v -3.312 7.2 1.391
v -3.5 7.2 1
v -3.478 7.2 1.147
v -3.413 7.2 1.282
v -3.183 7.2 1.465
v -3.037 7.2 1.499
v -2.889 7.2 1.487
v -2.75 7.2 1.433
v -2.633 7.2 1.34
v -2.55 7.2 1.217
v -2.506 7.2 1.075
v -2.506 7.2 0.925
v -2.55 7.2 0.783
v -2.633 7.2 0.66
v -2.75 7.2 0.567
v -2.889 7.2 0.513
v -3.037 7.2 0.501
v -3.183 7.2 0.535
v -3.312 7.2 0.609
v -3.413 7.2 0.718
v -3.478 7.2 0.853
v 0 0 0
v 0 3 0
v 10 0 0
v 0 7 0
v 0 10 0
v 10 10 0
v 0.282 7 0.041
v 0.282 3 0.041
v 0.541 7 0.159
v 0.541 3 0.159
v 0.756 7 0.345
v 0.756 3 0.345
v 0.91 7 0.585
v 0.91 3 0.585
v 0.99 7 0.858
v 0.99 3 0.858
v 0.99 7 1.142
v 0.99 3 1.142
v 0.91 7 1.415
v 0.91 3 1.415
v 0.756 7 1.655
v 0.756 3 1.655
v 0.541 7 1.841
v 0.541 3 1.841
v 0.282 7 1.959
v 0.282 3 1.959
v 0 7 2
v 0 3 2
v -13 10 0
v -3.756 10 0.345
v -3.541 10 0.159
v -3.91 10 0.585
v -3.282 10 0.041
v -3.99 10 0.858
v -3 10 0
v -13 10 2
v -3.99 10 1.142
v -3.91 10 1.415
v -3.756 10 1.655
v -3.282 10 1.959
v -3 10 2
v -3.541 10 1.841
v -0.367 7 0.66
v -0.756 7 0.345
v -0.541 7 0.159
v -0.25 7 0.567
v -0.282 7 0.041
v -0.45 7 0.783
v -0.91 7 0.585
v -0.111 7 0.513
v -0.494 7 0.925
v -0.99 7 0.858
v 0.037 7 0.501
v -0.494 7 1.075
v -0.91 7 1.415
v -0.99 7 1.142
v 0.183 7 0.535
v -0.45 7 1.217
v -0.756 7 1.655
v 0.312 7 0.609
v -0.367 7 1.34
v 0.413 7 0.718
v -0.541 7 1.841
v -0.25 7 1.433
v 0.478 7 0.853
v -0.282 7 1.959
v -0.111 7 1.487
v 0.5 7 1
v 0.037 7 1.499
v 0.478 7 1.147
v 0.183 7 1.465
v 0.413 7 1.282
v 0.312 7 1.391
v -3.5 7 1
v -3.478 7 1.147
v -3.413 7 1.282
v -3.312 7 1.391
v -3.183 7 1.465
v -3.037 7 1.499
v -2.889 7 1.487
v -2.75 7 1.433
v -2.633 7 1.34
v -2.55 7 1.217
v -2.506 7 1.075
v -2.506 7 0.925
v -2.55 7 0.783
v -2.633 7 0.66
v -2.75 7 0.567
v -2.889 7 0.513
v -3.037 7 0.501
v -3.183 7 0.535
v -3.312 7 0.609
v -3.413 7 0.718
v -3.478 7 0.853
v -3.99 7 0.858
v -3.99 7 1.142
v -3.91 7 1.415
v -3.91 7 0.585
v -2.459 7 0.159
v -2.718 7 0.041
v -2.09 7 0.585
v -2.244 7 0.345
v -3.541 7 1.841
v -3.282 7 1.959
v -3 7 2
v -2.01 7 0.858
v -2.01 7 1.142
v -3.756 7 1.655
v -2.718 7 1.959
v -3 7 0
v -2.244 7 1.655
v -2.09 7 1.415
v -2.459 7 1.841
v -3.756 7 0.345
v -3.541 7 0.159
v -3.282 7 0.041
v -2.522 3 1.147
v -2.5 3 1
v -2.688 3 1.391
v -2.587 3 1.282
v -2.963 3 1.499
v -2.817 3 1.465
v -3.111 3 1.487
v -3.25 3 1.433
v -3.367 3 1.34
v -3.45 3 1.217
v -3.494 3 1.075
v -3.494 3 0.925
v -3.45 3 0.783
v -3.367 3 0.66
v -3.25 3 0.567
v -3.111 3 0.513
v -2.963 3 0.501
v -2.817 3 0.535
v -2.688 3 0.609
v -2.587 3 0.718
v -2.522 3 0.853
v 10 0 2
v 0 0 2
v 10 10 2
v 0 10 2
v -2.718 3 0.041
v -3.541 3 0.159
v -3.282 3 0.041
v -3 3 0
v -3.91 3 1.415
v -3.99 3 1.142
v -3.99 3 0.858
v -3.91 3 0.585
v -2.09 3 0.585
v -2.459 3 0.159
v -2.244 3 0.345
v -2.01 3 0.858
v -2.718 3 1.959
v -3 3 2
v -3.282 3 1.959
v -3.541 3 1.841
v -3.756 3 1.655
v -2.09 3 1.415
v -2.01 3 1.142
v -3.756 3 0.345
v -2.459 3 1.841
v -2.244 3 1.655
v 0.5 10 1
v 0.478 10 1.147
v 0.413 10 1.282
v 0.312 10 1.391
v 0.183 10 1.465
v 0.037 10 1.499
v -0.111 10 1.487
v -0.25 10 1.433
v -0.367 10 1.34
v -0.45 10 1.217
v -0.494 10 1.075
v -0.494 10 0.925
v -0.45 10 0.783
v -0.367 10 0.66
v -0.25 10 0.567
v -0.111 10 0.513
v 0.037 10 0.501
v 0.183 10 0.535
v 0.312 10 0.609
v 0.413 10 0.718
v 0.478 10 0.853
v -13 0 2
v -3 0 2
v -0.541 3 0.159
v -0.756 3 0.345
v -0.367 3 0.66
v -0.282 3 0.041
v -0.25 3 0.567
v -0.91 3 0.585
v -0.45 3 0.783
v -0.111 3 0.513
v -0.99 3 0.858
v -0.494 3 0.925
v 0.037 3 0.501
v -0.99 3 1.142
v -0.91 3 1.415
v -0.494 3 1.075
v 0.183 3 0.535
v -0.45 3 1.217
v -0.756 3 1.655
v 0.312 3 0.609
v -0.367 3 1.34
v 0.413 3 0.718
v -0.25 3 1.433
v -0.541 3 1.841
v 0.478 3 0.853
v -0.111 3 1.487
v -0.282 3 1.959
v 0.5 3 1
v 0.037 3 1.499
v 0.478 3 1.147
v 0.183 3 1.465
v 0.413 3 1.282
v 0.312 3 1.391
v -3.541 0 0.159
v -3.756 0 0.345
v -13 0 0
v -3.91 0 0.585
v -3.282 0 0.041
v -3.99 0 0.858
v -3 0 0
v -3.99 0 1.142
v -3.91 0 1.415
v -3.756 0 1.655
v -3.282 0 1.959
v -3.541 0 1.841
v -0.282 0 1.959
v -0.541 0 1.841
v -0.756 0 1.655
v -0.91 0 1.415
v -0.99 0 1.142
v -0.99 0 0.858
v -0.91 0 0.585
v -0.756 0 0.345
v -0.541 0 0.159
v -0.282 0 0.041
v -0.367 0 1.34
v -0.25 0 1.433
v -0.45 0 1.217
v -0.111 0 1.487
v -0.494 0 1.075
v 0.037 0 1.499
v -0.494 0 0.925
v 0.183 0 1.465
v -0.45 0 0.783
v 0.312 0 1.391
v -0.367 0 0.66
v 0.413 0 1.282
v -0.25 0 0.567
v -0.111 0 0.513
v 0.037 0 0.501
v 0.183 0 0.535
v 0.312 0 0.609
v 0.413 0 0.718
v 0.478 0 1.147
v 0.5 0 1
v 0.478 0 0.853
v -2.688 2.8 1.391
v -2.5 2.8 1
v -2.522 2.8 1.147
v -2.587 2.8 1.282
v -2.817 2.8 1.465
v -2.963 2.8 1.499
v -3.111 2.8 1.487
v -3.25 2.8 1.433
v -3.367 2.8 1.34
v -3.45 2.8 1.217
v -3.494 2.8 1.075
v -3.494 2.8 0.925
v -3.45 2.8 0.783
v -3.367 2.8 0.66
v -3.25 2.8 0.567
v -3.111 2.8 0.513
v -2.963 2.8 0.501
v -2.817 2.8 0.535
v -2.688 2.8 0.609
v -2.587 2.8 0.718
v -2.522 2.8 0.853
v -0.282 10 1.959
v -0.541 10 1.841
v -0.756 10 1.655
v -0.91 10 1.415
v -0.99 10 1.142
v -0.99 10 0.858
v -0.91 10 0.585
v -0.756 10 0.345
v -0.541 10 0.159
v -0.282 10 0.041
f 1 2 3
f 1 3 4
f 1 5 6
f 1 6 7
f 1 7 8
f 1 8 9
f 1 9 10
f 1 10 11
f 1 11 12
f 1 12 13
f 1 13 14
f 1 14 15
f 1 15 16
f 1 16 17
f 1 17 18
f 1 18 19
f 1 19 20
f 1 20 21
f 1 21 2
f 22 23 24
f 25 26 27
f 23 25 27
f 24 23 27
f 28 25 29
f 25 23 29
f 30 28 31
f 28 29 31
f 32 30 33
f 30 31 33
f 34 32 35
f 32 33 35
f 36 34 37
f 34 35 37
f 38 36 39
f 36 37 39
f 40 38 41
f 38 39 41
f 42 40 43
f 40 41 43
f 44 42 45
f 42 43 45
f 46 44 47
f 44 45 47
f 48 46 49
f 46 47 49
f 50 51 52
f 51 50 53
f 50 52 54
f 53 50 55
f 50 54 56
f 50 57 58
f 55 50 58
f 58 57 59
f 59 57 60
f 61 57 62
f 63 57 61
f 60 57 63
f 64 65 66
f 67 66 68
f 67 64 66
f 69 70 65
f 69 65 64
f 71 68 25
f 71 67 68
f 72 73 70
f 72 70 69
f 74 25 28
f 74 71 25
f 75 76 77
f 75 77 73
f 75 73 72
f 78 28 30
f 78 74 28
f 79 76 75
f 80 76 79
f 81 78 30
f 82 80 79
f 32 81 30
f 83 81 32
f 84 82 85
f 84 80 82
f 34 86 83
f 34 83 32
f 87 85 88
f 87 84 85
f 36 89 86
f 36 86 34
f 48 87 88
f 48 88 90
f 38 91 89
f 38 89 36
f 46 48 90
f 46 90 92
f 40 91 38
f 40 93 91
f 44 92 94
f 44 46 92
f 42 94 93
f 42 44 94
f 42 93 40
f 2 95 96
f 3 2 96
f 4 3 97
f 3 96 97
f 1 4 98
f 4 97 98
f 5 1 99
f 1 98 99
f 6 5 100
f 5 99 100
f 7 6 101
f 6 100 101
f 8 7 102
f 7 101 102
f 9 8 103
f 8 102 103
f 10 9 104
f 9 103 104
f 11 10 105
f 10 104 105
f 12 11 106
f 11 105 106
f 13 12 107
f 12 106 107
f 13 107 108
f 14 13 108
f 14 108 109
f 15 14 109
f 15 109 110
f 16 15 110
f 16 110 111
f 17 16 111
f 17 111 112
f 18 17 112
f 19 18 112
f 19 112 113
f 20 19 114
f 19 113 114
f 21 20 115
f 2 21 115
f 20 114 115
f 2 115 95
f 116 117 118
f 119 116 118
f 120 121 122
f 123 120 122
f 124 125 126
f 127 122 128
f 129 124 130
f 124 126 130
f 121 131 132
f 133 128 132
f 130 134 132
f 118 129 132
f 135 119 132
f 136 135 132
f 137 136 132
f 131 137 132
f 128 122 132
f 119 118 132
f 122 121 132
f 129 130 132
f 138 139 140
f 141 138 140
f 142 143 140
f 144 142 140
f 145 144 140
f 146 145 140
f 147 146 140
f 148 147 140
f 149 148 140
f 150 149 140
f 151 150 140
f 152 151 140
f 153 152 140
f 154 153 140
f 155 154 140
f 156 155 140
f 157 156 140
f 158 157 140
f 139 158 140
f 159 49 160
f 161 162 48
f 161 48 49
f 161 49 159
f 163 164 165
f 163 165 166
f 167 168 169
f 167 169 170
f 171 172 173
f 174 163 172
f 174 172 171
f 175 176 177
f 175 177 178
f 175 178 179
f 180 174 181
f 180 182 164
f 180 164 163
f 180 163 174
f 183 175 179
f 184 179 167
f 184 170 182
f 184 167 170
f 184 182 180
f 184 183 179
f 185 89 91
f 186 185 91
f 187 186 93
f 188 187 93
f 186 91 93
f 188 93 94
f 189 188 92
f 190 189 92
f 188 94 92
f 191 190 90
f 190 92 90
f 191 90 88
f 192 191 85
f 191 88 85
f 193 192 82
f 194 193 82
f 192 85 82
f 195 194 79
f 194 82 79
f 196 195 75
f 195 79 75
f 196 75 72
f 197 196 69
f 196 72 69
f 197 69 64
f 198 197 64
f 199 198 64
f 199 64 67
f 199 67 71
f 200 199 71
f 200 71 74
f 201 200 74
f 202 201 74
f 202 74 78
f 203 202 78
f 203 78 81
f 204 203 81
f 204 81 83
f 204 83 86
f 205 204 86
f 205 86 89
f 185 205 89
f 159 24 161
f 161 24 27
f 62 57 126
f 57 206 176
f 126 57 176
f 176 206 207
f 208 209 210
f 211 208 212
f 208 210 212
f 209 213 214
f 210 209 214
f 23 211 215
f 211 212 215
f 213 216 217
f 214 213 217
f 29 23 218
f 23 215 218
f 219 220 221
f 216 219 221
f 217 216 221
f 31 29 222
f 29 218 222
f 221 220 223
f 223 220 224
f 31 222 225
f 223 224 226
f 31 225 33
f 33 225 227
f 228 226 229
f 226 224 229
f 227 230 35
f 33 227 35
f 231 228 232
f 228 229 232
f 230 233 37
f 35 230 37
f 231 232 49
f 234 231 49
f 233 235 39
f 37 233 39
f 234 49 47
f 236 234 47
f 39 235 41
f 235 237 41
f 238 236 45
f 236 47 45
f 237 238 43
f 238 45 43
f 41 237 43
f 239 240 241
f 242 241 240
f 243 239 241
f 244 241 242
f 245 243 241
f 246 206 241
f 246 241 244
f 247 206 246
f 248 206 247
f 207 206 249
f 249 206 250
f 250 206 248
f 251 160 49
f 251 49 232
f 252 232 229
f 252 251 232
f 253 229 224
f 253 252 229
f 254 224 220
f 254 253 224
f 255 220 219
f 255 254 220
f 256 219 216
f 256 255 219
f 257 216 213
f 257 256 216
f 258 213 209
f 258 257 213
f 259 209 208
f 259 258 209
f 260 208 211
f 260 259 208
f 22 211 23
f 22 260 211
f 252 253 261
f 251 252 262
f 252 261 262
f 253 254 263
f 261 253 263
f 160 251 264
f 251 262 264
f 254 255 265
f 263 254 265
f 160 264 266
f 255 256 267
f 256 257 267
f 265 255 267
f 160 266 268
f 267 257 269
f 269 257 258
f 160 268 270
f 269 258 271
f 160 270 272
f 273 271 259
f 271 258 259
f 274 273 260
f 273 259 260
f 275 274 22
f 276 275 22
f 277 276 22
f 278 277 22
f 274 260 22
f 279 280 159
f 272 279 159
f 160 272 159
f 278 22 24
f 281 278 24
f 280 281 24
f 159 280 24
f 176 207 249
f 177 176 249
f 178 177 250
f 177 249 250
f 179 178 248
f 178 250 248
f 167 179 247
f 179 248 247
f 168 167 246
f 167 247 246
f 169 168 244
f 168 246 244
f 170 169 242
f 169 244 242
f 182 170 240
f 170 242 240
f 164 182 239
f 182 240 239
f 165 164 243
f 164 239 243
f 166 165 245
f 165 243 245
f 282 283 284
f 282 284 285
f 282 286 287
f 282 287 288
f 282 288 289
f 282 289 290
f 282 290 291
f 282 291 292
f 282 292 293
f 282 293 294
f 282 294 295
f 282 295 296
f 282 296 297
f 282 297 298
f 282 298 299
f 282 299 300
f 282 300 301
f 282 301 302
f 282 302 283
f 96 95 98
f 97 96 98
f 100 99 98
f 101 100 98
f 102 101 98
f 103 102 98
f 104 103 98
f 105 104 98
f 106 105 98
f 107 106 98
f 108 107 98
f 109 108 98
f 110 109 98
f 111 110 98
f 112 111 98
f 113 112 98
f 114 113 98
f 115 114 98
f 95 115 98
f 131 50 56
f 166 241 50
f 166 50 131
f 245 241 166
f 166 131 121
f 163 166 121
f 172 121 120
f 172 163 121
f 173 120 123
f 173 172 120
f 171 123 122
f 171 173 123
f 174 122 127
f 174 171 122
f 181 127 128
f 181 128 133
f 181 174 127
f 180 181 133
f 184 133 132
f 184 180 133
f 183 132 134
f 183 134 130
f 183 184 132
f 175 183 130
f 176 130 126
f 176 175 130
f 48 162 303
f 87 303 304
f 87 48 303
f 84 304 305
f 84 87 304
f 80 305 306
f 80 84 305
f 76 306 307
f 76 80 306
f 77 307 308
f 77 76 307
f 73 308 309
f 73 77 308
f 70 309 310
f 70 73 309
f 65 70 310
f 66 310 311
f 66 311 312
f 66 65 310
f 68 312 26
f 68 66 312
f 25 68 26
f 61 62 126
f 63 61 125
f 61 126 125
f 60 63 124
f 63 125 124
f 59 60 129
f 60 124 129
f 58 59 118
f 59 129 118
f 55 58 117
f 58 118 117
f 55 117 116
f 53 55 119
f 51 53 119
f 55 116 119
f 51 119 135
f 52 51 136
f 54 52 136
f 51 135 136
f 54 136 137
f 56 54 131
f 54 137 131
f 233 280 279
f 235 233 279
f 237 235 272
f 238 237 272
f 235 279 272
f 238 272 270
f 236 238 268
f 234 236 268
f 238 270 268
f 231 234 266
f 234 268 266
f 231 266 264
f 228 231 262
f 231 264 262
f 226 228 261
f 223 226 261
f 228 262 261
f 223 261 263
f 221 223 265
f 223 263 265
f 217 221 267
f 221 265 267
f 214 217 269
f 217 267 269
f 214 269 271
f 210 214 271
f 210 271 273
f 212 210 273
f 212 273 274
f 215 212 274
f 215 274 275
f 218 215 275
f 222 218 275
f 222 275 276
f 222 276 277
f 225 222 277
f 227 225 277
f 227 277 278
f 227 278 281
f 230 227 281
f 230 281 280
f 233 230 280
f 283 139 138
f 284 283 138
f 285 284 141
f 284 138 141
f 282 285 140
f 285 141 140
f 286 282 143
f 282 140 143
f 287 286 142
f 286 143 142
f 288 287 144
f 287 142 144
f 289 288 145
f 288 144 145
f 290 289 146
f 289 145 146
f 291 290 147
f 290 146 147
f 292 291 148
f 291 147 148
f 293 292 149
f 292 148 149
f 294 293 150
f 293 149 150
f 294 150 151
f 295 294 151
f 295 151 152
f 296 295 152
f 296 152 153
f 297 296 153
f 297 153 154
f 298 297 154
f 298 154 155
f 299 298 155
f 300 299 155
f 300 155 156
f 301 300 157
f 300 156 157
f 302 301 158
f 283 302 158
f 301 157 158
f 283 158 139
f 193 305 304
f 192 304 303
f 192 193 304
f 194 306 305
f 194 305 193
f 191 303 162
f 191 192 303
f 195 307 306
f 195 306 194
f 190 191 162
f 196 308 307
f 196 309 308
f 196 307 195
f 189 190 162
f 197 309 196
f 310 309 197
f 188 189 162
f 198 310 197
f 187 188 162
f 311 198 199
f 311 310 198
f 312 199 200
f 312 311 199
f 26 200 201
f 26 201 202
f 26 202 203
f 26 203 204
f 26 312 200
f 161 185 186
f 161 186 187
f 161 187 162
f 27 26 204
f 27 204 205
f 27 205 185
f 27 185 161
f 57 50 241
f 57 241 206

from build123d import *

# Parameters (mm, degrees)
SKETCH004_R         = 1
PAD004_DEPTH        = 3
SKETCH005_R         = 1
PAD005_DEPTH        = 3
SKETCH003_R         = 1
PAD003_DEPTH        = 4
SKETCH002_W         = 10
SKETCH002_H         = 2
PAD002_DEPTH        = 10
SKETCH007_R         = 0.5
PAD006_DEPTH        = 0.2
SKETCH008_R         = 0.5
PAD007_DEPTH        = 0.2
SKETCH001_R         = 1
SKETCH001_R_2       = 0.5
PAD_DEPTH           = 4
CYLINDER_R          = 1
CYLINDER_DEPTH      = 10
CYLINDER_ROLL_ANGLE = 90
BOX_W               = 10
BOX_H               = 10
BOX_DEPTH           = 2
SKETCH_R            = 1
SKETCH_R_2          = 0.5
PAD008_DEPTH        = 10


with BuildPart() as pad004:
    # Sketch004 → Pad004 (new body)
    with BuildSketch(Plane.XZ):
        with Locations((-3, 1)):
            Circle(SKETCH004_R)
    extrude(amount=-PAD004_DEPTH)


with BuildPart() as pad005:
    # Sketch005 → Pad005 (new body)
    with BuildSketch(Plane.XZ.offset(-7)):
        with Locations((-3, 1)):
            Circle(SKETCH005_R)
    extrude(amount=-PAD005_DEPTH)


with BuildPart() as pad003:
    # Sketch003 → Pad003 (new body)
    with BuildSketch(Plane.XZ.offset(-3)):
        with Locations((-3, 1)):
            Circle(SKETCH003_R)
    extrude(amount=-PAD003_DEPTH)


with BuildPart() as cut002:
    # Sketch002 → Pad002 (new body)
    with BuildSketch(Plane(origin=(-3, 0, 0), x_dir=(1, 0, 0), z_dir=(0, -1, 0))):
        with Locations((-5, 1)):
            Rectangle(SKETCH002_W, SKETCH002_H)
    extrude(amount=-PAD002_DEPTH)

    # Fusion001: union Pad003
    add(pad003.part)

    # Cut001: cut Pad005
    add(pad005.part, mode=Mode.SUBTRACT)

    # Cut002: cut Pad004
    add(pad004.part, mode=Mode.SUBTRACT)


with BuildPart() as pad006:
    # Sketch007 → Pad006 (new body)
    with BuildSketch(Plane.XZ.offset(-3)):
        with Locations((-3, 1)):
            Circle(SKETCH007_R)
    extrude(amount=PAD006_DEPTH)


with BuildPart() as pad007:
    # Sketch008 → Pad007 (new body)
    with BuildSketch(Plane(origin=(0, 7, 0), x_dir=(-1, 0, 0), z_dir=(0, 1, 0))):
        with Locations((3, 1)):
            Circle(SKETCH008_R)
    extrude(amount=PAD007_DEPTH)


with BuildPart() as pad:
    # Sketch001 → Pad (new body)
    with BuildSketch(Plane.XZ.offset(-3)):
        with Locations((0, 1)):
            Circle(SKETCH001_R)
        with Locations((0, 1)):
            Circle(SKETCH001_R_2, mode=Mode.SUBTRACT)
    extrude(amount=-PAD_DEPTH)


with BuildPart() as cylinder:
    # Cylinder → Cylinder (new body)
    with BuildSketch(Plane.XY):
        Circle(CYLINDER_R)
    extrude(amount=CYLINDER_DEPTH)


with BuildPart() as cylinder_1:
    # Cylinder roll: moved
    add(cylinder.part.rotate(Axis((0, 0, 0), (1, 0, 0)), CYLINDER_ROLL_ANGLE))


with BuildPart() as cylinder_2:
    # Cylinder placement: moved
    add(cylinder_1.part.moved(Location((0, 10, 1))))


with BuildPart() as cut:
    # Box → Box (new body)
    with BuildSketch(Plane.XY):
        with Locations((5, 5)):
            Rectangle(BOX_W, BOX_H)
    extrude(amount=BOX_DEPTH)

    # Cut: cut Cylinder
    add(cylinder_2.part, mode=Mode.SUBTRACT)


with BuildPart() as cut003:
    # Sketch → Pad008 (new body)
    with BuildSketch(Plane.XZ):
        with Locations((0, 1)):
            Circle(SKETCH_R)
        with Locations((0, 1)):
            Circle(SKETCH_R_2, mode=Mode.SUBTRACT)
    extrude(amount=-PAD008_DEPTH)

    # Fusion: union Cut
    add(cut.part)

    # Cut003: cut Pad
    add(pad.part, mode=Mode.SUBTRACT)


solid = Compound([cut002.part, pad006.part, pad007.part, cut003.part])
